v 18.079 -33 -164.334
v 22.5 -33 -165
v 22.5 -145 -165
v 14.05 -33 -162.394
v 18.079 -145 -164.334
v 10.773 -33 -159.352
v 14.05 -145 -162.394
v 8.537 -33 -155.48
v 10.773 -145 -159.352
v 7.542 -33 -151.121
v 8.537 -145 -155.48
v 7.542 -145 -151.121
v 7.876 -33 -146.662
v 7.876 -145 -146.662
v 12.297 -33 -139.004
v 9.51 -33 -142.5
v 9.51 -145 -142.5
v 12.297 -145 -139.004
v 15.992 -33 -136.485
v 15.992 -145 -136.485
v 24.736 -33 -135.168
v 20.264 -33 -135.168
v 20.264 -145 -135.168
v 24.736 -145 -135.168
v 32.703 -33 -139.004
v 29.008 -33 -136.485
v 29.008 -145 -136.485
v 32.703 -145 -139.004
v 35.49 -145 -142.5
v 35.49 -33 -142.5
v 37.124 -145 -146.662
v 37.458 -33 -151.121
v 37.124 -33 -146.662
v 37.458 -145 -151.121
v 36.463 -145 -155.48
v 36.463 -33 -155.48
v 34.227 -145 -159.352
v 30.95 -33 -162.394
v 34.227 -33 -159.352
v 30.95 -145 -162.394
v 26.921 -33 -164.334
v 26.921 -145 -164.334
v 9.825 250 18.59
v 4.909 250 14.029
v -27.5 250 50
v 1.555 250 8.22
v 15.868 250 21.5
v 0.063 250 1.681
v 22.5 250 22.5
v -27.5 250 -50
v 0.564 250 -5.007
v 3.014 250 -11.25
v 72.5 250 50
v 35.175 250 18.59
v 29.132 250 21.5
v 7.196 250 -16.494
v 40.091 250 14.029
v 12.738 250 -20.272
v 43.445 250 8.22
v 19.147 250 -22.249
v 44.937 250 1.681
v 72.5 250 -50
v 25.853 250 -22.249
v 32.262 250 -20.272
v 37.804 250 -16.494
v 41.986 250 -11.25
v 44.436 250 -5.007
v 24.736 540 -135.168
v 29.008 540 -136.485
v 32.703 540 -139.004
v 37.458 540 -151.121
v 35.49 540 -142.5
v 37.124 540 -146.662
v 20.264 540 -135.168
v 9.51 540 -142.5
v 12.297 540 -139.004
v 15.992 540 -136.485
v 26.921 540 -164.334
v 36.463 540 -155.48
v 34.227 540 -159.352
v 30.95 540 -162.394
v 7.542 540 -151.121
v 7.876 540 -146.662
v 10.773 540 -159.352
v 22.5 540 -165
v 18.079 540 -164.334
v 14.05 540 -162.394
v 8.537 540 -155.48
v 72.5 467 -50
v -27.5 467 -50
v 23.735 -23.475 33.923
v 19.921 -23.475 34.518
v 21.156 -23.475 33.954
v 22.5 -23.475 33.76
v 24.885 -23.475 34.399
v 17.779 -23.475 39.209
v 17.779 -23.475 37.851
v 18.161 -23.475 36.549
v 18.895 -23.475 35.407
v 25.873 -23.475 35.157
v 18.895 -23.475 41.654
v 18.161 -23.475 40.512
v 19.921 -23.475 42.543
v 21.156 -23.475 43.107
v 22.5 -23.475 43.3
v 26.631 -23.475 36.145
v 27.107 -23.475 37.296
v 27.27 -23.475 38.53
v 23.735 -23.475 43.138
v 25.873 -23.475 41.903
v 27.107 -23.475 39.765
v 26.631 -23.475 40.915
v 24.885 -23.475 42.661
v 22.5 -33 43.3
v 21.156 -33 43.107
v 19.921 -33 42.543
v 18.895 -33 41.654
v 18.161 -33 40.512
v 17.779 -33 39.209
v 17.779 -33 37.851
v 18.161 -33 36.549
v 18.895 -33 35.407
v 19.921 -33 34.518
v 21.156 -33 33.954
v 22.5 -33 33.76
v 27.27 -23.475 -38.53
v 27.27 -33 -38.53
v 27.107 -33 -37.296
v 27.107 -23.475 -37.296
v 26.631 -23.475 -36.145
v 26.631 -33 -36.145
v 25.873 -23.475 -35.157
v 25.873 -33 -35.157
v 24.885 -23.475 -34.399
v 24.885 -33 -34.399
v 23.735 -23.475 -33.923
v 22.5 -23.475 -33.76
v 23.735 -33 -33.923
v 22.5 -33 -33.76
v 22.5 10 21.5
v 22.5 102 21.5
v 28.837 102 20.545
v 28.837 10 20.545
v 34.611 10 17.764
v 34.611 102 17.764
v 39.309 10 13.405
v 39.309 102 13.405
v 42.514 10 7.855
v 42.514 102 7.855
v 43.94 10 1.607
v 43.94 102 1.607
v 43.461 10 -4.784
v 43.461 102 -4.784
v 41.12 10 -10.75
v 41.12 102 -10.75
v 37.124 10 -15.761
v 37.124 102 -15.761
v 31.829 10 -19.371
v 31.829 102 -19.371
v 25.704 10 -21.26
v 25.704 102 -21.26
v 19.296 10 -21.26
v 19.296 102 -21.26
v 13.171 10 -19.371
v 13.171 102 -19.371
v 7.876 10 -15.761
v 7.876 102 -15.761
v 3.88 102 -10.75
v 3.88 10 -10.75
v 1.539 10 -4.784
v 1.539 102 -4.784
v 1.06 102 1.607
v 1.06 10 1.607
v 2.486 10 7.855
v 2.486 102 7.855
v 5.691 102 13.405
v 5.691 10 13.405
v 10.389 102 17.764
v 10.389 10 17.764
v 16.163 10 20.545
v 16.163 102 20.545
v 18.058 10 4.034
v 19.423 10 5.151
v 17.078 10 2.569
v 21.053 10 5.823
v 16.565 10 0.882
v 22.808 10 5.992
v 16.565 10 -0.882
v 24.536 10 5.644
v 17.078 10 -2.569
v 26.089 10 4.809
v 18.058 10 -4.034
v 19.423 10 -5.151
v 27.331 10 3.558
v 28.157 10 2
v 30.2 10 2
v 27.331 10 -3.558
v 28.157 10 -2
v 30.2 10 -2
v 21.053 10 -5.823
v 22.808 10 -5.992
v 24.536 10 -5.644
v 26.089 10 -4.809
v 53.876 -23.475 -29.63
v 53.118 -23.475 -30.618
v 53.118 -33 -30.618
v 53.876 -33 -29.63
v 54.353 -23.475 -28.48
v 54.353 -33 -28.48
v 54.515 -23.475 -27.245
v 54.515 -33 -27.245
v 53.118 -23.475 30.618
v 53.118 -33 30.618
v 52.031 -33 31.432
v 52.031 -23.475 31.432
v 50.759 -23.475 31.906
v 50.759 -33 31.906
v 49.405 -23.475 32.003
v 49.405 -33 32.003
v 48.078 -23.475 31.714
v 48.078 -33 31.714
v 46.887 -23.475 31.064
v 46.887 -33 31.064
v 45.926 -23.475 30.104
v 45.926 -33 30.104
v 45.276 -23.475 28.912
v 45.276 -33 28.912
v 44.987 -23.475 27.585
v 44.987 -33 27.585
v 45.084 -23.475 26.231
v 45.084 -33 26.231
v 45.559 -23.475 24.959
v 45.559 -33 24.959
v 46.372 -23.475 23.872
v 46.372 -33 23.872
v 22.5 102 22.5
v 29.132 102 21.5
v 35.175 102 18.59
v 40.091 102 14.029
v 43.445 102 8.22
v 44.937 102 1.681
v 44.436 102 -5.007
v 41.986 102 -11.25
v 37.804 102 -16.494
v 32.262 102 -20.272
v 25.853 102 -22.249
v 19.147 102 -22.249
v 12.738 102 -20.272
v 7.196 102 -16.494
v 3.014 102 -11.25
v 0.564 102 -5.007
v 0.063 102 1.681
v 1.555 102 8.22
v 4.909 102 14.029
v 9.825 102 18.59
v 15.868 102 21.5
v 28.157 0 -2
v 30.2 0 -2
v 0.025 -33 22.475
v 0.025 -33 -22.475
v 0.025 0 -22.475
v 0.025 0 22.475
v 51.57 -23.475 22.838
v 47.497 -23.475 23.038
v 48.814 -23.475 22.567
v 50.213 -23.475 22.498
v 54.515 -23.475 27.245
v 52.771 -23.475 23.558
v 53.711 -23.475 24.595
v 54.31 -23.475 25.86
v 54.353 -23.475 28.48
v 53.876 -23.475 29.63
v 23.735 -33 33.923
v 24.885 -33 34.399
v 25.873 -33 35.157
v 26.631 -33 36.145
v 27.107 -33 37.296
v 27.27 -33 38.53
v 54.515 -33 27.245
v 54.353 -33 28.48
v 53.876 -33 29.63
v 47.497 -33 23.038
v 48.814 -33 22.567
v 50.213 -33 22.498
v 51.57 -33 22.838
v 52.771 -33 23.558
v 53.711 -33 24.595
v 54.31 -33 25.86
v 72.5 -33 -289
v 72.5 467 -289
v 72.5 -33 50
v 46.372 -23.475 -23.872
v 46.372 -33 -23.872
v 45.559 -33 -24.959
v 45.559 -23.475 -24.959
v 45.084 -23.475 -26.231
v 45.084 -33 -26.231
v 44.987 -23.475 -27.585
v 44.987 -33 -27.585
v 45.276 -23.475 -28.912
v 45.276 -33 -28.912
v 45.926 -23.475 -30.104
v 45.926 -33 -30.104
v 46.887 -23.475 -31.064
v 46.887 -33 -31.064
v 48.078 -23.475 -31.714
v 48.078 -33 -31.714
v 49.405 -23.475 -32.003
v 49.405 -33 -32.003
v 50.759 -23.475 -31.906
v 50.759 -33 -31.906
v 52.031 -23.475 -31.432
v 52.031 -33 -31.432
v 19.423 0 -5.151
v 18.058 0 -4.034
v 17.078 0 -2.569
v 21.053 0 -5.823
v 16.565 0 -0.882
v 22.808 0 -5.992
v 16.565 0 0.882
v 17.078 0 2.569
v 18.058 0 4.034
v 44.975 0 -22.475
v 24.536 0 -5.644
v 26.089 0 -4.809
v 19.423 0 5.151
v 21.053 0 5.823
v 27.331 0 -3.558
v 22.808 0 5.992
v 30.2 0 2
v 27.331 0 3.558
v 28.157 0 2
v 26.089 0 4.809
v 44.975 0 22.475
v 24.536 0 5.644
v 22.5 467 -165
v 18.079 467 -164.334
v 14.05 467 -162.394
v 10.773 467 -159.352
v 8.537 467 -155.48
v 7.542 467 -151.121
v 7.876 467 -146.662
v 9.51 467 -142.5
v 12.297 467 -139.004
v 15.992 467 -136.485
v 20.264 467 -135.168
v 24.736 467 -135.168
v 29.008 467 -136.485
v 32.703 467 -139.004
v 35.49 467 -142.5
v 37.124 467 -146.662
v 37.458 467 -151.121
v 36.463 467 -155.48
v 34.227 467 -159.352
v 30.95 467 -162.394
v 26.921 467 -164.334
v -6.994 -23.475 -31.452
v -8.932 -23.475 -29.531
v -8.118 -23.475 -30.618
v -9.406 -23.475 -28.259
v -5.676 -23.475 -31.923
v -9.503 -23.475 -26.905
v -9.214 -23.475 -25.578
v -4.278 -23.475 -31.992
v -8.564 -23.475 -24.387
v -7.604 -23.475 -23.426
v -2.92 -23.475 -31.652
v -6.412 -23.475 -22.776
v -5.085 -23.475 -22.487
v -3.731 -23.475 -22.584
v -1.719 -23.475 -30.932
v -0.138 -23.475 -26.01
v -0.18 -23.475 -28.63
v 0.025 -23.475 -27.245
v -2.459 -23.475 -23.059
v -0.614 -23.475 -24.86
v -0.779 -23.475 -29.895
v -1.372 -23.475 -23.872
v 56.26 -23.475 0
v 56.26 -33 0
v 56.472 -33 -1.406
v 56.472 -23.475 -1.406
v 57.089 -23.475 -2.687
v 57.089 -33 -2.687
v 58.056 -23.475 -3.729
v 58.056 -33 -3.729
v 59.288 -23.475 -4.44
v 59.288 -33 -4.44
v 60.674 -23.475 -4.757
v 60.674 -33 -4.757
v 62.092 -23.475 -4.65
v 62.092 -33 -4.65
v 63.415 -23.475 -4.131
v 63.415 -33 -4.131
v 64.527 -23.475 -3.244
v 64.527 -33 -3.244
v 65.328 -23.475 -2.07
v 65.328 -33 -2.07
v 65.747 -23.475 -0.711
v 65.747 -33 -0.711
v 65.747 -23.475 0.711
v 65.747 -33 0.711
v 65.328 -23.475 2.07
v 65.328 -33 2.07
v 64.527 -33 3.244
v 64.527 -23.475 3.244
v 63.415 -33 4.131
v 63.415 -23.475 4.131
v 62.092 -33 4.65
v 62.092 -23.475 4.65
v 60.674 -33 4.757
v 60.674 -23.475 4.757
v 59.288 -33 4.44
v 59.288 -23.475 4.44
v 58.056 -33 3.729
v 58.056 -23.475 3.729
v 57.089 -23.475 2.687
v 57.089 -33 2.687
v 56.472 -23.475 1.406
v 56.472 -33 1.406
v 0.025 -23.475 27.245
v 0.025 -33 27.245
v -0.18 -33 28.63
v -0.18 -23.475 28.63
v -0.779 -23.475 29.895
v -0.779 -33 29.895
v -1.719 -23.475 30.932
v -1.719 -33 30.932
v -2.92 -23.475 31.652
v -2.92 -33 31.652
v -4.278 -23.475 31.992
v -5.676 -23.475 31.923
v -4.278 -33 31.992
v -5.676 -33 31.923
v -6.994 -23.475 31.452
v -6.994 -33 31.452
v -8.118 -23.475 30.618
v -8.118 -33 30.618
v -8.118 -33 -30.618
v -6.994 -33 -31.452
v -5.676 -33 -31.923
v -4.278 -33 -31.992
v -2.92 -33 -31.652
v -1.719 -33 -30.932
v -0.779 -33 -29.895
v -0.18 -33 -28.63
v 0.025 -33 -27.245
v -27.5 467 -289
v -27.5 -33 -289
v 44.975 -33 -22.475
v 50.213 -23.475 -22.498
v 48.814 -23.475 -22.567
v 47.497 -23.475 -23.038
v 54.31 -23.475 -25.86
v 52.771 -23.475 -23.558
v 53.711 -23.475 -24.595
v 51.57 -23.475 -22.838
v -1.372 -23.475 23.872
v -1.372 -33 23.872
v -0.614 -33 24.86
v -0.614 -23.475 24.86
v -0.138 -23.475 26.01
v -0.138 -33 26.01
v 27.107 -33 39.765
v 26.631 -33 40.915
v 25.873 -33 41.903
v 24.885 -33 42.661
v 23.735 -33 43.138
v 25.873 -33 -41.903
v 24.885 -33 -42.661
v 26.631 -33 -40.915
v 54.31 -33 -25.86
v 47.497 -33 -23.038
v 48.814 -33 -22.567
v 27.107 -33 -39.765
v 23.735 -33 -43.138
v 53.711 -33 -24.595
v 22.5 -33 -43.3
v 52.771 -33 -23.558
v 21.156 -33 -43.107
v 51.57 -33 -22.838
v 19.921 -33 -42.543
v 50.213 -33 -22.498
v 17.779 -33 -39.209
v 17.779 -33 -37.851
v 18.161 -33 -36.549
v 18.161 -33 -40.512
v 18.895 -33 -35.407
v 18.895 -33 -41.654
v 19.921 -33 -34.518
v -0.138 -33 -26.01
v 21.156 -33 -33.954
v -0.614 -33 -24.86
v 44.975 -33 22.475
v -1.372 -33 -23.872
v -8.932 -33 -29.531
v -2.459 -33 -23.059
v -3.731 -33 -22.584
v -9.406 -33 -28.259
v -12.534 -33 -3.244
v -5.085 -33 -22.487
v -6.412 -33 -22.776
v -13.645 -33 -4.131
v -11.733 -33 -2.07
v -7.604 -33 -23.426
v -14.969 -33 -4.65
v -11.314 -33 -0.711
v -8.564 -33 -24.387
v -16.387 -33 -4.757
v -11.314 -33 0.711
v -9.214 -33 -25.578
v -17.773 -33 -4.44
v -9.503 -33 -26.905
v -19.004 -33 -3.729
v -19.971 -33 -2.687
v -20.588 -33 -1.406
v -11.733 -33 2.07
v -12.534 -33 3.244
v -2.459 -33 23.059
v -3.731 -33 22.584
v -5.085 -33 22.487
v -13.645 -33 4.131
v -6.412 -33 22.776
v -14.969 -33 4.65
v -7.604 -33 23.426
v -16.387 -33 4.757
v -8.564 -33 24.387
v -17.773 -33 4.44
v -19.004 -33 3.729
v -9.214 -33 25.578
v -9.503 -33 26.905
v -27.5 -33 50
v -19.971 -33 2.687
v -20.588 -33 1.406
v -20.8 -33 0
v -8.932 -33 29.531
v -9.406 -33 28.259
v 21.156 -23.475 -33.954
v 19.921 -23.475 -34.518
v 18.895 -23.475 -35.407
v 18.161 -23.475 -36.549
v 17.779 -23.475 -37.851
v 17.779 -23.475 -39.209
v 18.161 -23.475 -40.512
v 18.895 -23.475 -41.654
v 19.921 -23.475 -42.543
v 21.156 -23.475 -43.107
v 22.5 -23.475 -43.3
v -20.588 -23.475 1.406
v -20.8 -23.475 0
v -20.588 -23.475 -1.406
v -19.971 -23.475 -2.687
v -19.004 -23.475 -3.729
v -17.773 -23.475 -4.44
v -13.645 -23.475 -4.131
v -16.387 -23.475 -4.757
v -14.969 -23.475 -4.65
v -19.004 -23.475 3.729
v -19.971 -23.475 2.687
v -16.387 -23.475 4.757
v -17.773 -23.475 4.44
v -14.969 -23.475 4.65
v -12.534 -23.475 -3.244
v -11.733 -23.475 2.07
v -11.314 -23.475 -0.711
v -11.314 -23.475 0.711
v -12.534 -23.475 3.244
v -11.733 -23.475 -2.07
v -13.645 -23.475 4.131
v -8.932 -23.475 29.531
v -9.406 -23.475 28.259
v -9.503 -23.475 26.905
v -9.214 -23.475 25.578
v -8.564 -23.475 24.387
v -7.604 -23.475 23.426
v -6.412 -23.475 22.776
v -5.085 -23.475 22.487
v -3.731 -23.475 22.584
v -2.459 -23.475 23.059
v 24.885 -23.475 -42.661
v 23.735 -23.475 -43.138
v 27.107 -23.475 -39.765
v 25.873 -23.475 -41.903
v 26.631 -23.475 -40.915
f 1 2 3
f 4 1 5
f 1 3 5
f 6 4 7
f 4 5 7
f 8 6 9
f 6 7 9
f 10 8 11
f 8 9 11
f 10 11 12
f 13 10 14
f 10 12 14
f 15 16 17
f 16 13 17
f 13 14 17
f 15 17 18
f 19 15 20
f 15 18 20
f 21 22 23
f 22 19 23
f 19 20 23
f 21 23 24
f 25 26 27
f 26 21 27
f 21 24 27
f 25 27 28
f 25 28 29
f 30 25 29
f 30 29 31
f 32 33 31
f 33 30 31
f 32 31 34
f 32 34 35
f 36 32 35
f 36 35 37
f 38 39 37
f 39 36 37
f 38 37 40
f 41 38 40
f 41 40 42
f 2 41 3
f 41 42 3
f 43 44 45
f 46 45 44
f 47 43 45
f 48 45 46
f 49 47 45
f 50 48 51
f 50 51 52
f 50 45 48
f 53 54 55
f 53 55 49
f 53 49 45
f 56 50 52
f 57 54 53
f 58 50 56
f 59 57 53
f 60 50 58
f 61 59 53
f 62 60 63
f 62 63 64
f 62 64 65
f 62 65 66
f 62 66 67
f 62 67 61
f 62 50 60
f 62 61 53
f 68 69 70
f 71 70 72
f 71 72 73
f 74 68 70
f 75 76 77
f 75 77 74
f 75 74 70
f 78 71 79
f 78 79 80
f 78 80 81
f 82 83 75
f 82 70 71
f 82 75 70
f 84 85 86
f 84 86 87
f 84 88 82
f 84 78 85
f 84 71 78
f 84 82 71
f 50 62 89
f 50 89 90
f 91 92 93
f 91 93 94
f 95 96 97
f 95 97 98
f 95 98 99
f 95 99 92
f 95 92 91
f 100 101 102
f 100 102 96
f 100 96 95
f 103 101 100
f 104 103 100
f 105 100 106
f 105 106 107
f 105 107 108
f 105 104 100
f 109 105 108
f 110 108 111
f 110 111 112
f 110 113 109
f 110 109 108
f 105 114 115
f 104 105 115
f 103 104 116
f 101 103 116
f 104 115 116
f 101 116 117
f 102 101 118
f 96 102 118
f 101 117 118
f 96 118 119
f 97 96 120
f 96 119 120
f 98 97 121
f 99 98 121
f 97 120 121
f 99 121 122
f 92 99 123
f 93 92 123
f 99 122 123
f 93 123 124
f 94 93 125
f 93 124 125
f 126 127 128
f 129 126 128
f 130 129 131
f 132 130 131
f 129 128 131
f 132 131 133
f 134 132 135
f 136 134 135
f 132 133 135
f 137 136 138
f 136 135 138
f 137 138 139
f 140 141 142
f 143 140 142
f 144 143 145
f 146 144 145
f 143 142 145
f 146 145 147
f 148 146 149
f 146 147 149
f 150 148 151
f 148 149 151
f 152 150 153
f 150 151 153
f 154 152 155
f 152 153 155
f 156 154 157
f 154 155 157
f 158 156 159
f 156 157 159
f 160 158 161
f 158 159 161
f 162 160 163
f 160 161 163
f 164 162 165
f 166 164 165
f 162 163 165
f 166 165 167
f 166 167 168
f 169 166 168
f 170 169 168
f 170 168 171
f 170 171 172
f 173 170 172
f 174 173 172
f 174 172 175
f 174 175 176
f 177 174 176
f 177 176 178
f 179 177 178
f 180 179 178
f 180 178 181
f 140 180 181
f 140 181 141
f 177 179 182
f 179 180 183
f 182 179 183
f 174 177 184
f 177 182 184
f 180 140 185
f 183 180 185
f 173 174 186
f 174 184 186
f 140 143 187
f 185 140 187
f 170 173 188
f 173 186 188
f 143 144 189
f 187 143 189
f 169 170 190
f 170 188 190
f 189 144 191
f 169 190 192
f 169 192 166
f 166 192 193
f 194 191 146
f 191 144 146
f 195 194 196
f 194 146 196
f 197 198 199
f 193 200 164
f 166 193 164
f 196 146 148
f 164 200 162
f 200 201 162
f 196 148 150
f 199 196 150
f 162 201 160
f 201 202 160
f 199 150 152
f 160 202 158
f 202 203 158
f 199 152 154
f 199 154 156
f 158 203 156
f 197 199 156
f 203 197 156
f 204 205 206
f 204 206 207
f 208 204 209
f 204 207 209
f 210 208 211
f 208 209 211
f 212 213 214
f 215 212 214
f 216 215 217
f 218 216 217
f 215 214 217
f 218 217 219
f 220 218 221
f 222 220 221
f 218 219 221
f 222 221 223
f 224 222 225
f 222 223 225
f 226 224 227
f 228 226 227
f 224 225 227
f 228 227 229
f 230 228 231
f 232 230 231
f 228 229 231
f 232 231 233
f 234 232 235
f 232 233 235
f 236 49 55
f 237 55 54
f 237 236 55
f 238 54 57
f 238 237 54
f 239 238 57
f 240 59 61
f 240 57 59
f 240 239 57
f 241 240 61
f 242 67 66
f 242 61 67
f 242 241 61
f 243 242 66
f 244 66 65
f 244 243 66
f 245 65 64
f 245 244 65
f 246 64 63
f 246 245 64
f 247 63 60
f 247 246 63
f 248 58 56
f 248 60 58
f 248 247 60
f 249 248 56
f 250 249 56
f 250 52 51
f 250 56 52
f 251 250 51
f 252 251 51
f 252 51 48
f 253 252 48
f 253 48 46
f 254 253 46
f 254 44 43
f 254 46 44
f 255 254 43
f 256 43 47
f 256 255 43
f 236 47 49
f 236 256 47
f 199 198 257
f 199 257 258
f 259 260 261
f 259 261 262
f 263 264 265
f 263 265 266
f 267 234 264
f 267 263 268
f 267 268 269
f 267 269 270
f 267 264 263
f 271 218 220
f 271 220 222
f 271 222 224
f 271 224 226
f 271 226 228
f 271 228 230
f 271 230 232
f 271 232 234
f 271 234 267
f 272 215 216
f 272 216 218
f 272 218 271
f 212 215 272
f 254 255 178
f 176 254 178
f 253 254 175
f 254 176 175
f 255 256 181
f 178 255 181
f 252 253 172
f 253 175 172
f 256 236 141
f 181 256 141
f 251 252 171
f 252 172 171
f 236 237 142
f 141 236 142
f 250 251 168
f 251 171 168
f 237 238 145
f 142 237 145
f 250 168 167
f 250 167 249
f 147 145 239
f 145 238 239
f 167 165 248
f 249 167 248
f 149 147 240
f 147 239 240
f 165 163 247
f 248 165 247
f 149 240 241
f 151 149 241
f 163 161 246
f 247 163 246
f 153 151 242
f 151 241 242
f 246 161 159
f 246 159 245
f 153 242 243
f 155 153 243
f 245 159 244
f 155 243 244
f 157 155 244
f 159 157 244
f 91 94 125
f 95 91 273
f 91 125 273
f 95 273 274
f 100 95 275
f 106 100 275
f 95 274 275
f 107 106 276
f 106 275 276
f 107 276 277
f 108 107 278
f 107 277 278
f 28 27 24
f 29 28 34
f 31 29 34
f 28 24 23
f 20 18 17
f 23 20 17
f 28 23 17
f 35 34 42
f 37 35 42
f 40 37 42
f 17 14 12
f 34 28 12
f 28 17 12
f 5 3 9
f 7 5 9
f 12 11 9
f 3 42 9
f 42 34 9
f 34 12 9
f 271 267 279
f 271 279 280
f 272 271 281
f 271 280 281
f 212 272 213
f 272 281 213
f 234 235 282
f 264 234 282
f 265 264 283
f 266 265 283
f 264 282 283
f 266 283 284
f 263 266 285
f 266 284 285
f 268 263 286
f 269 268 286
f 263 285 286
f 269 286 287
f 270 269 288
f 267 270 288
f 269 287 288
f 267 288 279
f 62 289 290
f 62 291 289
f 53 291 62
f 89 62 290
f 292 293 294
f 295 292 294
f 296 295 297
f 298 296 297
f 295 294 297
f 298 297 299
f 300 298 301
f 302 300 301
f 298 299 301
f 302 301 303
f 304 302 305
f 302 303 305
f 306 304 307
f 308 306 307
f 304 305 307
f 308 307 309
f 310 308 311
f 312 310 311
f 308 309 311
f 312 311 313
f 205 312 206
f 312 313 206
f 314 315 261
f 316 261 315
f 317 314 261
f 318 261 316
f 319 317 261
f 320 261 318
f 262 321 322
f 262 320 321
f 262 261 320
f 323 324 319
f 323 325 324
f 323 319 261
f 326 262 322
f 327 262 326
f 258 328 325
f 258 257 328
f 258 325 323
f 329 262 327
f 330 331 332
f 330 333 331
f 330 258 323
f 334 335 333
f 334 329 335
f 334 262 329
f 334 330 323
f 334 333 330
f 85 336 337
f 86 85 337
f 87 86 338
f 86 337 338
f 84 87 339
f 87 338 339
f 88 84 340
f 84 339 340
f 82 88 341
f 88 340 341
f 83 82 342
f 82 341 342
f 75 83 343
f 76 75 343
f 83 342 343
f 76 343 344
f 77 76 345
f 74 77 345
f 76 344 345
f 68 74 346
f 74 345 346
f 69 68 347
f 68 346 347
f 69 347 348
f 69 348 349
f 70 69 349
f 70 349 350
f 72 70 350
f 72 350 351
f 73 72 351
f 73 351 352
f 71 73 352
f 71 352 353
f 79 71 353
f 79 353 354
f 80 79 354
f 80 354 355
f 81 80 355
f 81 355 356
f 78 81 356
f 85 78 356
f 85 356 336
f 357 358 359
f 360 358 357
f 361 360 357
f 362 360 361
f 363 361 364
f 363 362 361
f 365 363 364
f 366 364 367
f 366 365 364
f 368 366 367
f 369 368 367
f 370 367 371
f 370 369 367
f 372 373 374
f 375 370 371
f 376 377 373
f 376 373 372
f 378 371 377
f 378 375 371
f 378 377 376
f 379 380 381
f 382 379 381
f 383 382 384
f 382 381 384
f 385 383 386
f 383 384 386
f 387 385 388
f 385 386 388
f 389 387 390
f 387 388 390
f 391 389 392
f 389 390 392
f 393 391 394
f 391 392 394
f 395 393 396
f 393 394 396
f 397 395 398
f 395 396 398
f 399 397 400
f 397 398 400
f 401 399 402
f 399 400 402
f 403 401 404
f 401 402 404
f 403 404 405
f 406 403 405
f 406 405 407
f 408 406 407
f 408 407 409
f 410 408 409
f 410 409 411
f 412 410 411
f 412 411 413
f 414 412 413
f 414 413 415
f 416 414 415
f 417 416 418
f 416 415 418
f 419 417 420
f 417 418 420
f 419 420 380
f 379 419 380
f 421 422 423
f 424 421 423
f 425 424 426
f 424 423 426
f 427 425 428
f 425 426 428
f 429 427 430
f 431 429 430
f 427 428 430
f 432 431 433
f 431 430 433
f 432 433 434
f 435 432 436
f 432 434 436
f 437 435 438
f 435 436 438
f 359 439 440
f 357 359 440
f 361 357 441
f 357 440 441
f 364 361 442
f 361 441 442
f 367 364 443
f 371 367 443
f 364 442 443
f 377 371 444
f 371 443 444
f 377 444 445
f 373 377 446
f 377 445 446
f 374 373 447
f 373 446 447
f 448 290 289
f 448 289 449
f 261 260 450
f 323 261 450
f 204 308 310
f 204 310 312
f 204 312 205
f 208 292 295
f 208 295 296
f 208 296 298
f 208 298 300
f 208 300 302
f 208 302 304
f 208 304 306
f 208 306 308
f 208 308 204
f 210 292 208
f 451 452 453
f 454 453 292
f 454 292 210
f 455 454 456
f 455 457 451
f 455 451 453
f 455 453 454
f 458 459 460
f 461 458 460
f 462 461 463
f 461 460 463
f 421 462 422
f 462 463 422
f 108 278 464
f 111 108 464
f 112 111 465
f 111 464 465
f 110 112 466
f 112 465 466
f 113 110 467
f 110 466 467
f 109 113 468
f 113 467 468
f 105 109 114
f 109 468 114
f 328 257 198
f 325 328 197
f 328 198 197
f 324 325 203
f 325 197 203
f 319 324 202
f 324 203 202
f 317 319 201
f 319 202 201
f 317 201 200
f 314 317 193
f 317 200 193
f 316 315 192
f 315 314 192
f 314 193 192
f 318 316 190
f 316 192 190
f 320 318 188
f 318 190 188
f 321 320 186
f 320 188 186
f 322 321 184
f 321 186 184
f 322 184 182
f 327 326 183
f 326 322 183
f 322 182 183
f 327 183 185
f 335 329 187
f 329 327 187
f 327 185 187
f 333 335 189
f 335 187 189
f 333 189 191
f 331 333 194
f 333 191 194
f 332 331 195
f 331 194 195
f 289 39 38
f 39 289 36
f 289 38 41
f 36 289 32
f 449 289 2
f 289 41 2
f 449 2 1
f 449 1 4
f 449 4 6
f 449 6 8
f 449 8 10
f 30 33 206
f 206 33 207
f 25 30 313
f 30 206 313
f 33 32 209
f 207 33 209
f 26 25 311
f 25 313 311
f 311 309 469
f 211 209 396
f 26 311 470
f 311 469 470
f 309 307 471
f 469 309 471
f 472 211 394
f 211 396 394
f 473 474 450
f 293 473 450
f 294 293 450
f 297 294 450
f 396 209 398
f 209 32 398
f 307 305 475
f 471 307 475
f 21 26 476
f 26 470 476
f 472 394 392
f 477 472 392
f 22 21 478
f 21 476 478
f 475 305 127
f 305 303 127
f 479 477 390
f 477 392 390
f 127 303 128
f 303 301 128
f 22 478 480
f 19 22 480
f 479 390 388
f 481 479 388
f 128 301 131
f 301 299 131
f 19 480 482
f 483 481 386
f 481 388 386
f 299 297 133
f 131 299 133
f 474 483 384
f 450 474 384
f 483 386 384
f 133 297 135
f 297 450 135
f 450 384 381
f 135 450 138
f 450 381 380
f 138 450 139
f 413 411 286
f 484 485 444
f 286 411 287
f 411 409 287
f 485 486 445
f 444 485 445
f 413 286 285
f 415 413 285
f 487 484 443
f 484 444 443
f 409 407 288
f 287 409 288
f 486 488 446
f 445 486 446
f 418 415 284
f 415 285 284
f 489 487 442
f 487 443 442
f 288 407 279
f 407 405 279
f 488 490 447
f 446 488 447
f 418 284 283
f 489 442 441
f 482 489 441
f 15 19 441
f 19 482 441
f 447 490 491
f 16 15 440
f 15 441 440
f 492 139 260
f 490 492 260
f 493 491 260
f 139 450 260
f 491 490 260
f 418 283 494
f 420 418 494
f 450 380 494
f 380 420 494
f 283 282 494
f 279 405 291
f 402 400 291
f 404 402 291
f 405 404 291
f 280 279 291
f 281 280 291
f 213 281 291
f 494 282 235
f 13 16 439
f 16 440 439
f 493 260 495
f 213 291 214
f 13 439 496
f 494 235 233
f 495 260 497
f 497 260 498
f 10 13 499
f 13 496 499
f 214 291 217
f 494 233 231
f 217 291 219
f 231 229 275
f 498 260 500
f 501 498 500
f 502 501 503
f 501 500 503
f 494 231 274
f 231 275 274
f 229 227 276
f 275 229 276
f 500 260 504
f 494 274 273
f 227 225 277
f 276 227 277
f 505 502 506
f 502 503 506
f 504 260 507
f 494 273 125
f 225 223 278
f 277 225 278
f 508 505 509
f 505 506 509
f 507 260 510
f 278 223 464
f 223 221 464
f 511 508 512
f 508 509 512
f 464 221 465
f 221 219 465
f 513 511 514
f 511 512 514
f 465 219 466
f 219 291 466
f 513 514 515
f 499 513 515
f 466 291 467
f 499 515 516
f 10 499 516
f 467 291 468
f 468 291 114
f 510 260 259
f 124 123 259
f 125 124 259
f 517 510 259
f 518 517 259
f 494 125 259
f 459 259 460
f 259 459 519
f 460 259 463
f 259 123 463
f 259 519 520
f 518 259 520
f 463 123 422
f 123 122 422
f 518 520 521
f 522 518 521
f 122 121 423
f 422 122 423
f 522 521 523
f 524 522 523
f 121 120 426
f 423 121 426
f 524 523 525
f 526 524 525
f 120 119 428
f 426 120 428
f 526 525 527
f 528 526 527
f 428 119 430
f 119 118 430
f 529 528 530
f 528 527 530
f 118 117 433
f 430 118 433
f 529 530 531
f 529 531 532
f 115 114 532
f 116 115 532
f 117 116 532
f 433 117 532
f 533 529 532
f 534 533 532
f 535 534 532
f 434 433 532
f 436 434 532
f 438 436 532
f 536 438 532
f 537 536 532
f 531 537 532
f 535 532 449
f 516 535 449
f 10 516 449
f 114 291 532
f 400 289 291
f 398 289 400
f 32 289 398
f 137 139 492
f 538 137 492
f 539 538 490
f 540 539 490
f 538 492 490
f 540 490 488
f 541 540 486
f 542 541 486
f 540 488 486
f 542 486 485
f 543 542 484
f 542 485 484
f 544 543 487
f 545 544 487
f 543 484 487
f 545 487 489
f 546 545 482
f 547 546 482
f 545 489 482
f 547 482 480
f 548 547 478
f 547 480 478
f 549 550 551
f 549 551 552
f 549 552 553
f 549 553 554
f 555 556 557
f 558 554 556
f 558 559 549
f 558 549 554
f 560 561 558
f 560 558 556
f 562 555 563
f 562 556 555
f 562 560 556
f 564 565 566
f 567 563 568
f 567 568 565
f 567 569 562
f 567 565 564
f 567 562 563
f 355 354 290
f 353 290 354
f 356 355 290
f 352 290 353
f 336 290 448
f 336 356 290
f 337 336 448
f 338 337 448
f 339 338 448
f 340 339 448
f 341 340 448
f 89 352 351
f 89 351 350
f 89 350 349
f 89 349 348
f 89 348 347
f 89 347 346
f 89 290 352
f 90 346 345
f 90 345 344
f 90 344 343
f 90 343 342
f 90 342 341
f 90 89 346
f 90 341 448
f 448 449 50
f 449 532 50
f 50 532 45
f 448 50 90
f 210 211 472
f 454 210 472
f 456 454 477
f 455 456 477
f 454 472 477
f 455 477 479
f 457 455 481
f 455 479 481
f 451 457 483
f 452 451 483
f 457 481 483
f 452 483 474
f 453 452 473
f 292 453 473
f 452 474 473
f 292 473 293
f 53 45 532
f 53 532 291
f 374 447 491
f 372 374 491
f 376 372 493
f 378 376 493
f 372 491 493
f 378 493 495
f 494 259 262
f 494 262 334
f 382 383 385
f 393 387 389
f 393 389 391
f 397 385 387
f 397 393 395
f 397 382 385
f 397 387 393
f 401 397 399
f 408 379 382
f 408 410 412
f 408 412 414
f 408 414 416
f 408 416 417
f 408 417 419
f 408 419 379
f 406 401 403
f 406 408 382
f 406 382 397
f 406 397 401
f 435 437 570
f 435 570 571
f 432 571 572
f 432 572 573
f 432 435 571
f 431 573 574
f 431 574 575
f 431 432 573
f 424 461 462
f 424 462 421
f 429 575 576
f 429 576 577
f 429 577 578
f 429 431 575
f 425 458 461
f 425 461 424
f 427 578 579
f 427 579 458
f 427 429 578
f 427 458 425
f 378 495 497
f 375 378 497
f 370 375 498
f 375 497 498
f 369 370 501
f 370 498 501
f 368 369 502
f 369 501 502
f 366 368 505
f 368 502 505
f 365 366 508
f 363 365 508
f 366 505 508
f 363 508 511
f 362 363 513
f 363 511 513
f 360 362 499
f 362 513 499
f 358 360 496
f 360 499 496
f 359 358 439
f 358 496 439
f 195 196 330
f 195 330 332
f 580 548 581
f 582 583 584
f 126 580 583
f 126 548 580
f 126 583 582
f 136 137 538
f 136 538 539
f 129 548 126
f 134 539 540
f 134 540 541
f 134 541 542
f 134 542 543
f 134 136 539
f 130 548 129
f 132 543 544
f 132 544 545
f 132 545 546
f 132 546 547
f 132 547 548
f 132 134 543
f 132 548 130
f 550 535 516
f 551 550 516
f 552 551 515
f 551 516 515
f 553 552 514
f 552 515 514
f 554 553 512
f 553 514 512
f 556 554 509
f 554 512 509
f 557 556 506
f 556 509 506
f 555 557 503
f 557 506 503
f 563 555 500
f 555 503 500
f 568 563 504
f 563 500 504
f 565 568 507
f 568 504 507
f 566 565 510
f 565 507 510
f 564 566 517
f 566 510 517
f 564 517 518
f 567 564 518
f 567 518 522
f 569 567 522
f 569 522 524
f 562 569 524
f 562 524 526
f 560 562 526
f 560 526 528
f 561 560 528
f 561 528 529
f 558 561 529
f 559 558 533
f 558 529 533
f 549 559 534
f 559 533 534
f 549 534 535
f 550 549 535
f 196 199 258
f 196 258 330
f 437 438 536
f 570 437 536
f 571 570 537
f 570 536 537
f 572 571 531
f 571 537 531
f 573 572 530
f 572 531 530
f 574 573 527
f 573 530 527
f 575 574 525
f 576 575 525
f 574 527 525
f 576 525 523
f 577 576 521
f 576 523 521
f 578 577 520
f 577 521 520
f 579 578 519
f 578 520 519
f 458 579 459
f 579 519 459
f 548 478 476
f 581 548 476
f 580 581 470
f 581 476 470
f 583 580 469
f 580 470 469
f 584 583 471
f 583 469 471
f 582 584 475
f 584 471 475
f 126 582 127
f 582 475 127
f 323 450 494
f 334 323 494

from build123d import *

# Parameters (mm, degrees)
CUT_EXTRUDE_START     = -10
CUT_EXTRUDE_1_DEPTH   = 10
EXTRUDE_START         = -250
SKETCH_3_R            = 50
SKETCH_3_R_2          = 32.5
EXTRUDE_1_DEPTH       = 250
EXTRUDE_7_DEPTH       = 250
EXTRUDE_8_DEPTH       = 50
EXTRUDE_8_DEPTH_BACK  = 50
SKETCH_5_R            = 4.77
CUT_EXTRUDE_2_DEPTH   = 9.525
SKETCH_7_W            = 44.95012806
SKETCH_7_H            = 44.95012806
CUT_EXTRUDE_3_DEPTH   = 33
SKETCH_12_W           = 100
SKETCH_12_H           = 500
EXTRUDE_10_DEPTH      = 239
EXTRUDE_12_DEPTH      = 73
EXTRUDE_12_DEPTH_BACK = 612
SKETCH_13_R           = 15


with BuildPart() as part:
    # 草图1 → 旋转1 (revolve)
    with BuildSketch(Plane.XY):
        Polygon((16.5, 10), (1, 10), (1, 102), (0, 102), (0, 250), (-10, 250), (-10, 0), (16.5, 0), align=None)
        Polygon((28.5, 10), (28.5, 0), (55, 0), (55, 250), (45, 250), (45, 102), (44, 102), (44, 10), align=None)
    revolve(axis=Axis((22.5, 0, 0), (0, 1, 0)))

    # 草图2 → 切除-拉伸1 (cut)
    with BuildSketch(Plane.XZ.offset(CUT_EXTRUDE_START)):
        with BuildLine():
            Line((30.2, 2), (28.156854249, 2))
            ThreePointArc((28.156854249, 2), (28.5, 0), (28.156854249, -2))
            Line((28.156854249, -2), (30.2, -2))
            Line((30.2, -2), (30.2, 2))
        make_face()
    extrude(amount=CUT_EXTRUDE_1_DEPTH, mode=Mode.SUBTRACT)

    # 草图3 → 凸台-拉伸1 (add)
    with BuildSketch(Plane(origin=(0, 250, 0), x_dir=(1, 0, 0), z_dir=(0, 1, 0)).offset(EXTRUDE_START)):
        with Locations((22.5, 0)):
            Circle(SKETCH_3_R)
        with Locations((22.5, 0)):
            Circle(SKETCH_3_R_2, mode=Mode.SUBTRACT)
    extrude(amount=EXTRUDE_1_DEPTH)

    # 草图3<5> → 凸台-拉伸7 (add)
    with BuildSketch(Plane(origin=(0, 250, 0), x_dir=(1, 0, 0), z_dir=(0, 1, 0)).offset(EXTRUDE_START)):
        with BuildLine():
            ThreePointArc((22.5, -50), (-12.855339059, -35.355339059), (-27.5, 0))
            Line((-27.5, 0), (-27.5, -50))
            Line((-27.5, -50), (22.5, -50))
        make_face()
        with BuildLine():
            Line((-27.5, 50), (-27.5, 0))
            ThreePointArc((-27.5, 0), (-12.855339059, 35.355339059), (22.5, 50))
            Line((22.5, 50), (-27.5, 50))
        make_face()
        with BuildLine():
            Line((72.5, 50), (22.5, 50))
            ThreePointArc((22.5, 50), (57.855339059, 35.355339059), (72.5, 0))
            Line((72.5, 0), (72.5, 50))
        make_face()
        with BuildLine():
            ThreePointArc((72.5, 0), (57.855339059, -35.355339059), (22.5, -50))
            Line((22.5, -50), (72.5, -50))
            Line((72.5, -50), (72.5, 0))
        make_face()
    extrude(amount=EXTRUDE_7_DEPTH)

    # 草图1<21> → 凸台-拉伸8 (add, two sides: drawn at the far end of the back side and taken through both)
    with BuildSketch(Plane.XY.offset(-EXTRUDE_8_DEPTH_BACK)):
        Polygon((16.5, 0), (0, 0), (-10, 0), (-27.5, 0), (-27.5, -33), (72.5, -33), (72.5, 0), (55, 0), (45, 0), (28.5, 0), align=None)
    extrude(amount=EXTRUDE_8_DEPTH + EXTRUDE_8_DEPTH_BACK)

    # 草图5 → 切除-拉伸2 (cut)
    with BuildSketch(Plane.XZ.offset(33)):
        with Locations((-16.030339059, 0)):
            Circle(SKETCH_5_R)
        with Locations((-4.74506403, 27.24506403)):
            Circle(SKETCH_5_R)
        with Locations((22.5, 38.530339059)):
            Circle(SKETCH_5_R)
        with Locations((49.74506403, 27.24506403)):
            Circle(SKETCH_5_R)
        with Locations((61.030339059, 0)):
            Circle(SKETCH_5_R)
        with Locations((49.74506403, -27.24506403)):
            Circle(SKETCH_5_R)
        with Locations((22.5, -38.530339059)):
            Circle(SKETCH_5_R)
        with Locations((-4.74506403, -27.24506403)):
            Circle(SKETCH_5_R)
    extrude(amount=-CUT_EXTRUDE_2_DEPTH, mode=Mode.SUBTRACT)

    # 草图7 → 切除-拉伸3 (cut)
    with BuildSketch(Plane.XZ.offset(33)):
        with Locations((22.5, 0)):
            Rectangle(SKETCH_7_W, SKETCH_7_H)
    extrude(amount=-CUT_EXTRUDE_3_DEPTH, mode=Mode.SUBTRACT)

    # 草图12 → 凸台-拉伸10 (add)
    with BuildSketch(Plane(origin=(0, 0, -50), x_dir=(-1, 0, 0), z_dir=(0, 0, -1))):
        with Locations((-22.5, 217)):
            Rectangle(SKETCH_12_W, SKETCH_12_H)
    extrude(amount=EXTRUDE_10_DEPTH)

    # 草图13 → 凸台-拉伸12 (add, two sides: drawn at the far end of the back side and taken through both)
    with BuildSketch(Plane(origin=(0, 467, 0), x_dir=(1, 0, 0), z_dir=(0, 1, 0)).offset(-EXTRUDE_12_DEPTH_BACK)):
        with Locations((22.5, 150)):
            Circle(SKETCH_13_R)
    extrude(amount=EXTRUDE_12_DEPTH + EXTRUDE_12_DEPTH_BACK)


solid = part.part
